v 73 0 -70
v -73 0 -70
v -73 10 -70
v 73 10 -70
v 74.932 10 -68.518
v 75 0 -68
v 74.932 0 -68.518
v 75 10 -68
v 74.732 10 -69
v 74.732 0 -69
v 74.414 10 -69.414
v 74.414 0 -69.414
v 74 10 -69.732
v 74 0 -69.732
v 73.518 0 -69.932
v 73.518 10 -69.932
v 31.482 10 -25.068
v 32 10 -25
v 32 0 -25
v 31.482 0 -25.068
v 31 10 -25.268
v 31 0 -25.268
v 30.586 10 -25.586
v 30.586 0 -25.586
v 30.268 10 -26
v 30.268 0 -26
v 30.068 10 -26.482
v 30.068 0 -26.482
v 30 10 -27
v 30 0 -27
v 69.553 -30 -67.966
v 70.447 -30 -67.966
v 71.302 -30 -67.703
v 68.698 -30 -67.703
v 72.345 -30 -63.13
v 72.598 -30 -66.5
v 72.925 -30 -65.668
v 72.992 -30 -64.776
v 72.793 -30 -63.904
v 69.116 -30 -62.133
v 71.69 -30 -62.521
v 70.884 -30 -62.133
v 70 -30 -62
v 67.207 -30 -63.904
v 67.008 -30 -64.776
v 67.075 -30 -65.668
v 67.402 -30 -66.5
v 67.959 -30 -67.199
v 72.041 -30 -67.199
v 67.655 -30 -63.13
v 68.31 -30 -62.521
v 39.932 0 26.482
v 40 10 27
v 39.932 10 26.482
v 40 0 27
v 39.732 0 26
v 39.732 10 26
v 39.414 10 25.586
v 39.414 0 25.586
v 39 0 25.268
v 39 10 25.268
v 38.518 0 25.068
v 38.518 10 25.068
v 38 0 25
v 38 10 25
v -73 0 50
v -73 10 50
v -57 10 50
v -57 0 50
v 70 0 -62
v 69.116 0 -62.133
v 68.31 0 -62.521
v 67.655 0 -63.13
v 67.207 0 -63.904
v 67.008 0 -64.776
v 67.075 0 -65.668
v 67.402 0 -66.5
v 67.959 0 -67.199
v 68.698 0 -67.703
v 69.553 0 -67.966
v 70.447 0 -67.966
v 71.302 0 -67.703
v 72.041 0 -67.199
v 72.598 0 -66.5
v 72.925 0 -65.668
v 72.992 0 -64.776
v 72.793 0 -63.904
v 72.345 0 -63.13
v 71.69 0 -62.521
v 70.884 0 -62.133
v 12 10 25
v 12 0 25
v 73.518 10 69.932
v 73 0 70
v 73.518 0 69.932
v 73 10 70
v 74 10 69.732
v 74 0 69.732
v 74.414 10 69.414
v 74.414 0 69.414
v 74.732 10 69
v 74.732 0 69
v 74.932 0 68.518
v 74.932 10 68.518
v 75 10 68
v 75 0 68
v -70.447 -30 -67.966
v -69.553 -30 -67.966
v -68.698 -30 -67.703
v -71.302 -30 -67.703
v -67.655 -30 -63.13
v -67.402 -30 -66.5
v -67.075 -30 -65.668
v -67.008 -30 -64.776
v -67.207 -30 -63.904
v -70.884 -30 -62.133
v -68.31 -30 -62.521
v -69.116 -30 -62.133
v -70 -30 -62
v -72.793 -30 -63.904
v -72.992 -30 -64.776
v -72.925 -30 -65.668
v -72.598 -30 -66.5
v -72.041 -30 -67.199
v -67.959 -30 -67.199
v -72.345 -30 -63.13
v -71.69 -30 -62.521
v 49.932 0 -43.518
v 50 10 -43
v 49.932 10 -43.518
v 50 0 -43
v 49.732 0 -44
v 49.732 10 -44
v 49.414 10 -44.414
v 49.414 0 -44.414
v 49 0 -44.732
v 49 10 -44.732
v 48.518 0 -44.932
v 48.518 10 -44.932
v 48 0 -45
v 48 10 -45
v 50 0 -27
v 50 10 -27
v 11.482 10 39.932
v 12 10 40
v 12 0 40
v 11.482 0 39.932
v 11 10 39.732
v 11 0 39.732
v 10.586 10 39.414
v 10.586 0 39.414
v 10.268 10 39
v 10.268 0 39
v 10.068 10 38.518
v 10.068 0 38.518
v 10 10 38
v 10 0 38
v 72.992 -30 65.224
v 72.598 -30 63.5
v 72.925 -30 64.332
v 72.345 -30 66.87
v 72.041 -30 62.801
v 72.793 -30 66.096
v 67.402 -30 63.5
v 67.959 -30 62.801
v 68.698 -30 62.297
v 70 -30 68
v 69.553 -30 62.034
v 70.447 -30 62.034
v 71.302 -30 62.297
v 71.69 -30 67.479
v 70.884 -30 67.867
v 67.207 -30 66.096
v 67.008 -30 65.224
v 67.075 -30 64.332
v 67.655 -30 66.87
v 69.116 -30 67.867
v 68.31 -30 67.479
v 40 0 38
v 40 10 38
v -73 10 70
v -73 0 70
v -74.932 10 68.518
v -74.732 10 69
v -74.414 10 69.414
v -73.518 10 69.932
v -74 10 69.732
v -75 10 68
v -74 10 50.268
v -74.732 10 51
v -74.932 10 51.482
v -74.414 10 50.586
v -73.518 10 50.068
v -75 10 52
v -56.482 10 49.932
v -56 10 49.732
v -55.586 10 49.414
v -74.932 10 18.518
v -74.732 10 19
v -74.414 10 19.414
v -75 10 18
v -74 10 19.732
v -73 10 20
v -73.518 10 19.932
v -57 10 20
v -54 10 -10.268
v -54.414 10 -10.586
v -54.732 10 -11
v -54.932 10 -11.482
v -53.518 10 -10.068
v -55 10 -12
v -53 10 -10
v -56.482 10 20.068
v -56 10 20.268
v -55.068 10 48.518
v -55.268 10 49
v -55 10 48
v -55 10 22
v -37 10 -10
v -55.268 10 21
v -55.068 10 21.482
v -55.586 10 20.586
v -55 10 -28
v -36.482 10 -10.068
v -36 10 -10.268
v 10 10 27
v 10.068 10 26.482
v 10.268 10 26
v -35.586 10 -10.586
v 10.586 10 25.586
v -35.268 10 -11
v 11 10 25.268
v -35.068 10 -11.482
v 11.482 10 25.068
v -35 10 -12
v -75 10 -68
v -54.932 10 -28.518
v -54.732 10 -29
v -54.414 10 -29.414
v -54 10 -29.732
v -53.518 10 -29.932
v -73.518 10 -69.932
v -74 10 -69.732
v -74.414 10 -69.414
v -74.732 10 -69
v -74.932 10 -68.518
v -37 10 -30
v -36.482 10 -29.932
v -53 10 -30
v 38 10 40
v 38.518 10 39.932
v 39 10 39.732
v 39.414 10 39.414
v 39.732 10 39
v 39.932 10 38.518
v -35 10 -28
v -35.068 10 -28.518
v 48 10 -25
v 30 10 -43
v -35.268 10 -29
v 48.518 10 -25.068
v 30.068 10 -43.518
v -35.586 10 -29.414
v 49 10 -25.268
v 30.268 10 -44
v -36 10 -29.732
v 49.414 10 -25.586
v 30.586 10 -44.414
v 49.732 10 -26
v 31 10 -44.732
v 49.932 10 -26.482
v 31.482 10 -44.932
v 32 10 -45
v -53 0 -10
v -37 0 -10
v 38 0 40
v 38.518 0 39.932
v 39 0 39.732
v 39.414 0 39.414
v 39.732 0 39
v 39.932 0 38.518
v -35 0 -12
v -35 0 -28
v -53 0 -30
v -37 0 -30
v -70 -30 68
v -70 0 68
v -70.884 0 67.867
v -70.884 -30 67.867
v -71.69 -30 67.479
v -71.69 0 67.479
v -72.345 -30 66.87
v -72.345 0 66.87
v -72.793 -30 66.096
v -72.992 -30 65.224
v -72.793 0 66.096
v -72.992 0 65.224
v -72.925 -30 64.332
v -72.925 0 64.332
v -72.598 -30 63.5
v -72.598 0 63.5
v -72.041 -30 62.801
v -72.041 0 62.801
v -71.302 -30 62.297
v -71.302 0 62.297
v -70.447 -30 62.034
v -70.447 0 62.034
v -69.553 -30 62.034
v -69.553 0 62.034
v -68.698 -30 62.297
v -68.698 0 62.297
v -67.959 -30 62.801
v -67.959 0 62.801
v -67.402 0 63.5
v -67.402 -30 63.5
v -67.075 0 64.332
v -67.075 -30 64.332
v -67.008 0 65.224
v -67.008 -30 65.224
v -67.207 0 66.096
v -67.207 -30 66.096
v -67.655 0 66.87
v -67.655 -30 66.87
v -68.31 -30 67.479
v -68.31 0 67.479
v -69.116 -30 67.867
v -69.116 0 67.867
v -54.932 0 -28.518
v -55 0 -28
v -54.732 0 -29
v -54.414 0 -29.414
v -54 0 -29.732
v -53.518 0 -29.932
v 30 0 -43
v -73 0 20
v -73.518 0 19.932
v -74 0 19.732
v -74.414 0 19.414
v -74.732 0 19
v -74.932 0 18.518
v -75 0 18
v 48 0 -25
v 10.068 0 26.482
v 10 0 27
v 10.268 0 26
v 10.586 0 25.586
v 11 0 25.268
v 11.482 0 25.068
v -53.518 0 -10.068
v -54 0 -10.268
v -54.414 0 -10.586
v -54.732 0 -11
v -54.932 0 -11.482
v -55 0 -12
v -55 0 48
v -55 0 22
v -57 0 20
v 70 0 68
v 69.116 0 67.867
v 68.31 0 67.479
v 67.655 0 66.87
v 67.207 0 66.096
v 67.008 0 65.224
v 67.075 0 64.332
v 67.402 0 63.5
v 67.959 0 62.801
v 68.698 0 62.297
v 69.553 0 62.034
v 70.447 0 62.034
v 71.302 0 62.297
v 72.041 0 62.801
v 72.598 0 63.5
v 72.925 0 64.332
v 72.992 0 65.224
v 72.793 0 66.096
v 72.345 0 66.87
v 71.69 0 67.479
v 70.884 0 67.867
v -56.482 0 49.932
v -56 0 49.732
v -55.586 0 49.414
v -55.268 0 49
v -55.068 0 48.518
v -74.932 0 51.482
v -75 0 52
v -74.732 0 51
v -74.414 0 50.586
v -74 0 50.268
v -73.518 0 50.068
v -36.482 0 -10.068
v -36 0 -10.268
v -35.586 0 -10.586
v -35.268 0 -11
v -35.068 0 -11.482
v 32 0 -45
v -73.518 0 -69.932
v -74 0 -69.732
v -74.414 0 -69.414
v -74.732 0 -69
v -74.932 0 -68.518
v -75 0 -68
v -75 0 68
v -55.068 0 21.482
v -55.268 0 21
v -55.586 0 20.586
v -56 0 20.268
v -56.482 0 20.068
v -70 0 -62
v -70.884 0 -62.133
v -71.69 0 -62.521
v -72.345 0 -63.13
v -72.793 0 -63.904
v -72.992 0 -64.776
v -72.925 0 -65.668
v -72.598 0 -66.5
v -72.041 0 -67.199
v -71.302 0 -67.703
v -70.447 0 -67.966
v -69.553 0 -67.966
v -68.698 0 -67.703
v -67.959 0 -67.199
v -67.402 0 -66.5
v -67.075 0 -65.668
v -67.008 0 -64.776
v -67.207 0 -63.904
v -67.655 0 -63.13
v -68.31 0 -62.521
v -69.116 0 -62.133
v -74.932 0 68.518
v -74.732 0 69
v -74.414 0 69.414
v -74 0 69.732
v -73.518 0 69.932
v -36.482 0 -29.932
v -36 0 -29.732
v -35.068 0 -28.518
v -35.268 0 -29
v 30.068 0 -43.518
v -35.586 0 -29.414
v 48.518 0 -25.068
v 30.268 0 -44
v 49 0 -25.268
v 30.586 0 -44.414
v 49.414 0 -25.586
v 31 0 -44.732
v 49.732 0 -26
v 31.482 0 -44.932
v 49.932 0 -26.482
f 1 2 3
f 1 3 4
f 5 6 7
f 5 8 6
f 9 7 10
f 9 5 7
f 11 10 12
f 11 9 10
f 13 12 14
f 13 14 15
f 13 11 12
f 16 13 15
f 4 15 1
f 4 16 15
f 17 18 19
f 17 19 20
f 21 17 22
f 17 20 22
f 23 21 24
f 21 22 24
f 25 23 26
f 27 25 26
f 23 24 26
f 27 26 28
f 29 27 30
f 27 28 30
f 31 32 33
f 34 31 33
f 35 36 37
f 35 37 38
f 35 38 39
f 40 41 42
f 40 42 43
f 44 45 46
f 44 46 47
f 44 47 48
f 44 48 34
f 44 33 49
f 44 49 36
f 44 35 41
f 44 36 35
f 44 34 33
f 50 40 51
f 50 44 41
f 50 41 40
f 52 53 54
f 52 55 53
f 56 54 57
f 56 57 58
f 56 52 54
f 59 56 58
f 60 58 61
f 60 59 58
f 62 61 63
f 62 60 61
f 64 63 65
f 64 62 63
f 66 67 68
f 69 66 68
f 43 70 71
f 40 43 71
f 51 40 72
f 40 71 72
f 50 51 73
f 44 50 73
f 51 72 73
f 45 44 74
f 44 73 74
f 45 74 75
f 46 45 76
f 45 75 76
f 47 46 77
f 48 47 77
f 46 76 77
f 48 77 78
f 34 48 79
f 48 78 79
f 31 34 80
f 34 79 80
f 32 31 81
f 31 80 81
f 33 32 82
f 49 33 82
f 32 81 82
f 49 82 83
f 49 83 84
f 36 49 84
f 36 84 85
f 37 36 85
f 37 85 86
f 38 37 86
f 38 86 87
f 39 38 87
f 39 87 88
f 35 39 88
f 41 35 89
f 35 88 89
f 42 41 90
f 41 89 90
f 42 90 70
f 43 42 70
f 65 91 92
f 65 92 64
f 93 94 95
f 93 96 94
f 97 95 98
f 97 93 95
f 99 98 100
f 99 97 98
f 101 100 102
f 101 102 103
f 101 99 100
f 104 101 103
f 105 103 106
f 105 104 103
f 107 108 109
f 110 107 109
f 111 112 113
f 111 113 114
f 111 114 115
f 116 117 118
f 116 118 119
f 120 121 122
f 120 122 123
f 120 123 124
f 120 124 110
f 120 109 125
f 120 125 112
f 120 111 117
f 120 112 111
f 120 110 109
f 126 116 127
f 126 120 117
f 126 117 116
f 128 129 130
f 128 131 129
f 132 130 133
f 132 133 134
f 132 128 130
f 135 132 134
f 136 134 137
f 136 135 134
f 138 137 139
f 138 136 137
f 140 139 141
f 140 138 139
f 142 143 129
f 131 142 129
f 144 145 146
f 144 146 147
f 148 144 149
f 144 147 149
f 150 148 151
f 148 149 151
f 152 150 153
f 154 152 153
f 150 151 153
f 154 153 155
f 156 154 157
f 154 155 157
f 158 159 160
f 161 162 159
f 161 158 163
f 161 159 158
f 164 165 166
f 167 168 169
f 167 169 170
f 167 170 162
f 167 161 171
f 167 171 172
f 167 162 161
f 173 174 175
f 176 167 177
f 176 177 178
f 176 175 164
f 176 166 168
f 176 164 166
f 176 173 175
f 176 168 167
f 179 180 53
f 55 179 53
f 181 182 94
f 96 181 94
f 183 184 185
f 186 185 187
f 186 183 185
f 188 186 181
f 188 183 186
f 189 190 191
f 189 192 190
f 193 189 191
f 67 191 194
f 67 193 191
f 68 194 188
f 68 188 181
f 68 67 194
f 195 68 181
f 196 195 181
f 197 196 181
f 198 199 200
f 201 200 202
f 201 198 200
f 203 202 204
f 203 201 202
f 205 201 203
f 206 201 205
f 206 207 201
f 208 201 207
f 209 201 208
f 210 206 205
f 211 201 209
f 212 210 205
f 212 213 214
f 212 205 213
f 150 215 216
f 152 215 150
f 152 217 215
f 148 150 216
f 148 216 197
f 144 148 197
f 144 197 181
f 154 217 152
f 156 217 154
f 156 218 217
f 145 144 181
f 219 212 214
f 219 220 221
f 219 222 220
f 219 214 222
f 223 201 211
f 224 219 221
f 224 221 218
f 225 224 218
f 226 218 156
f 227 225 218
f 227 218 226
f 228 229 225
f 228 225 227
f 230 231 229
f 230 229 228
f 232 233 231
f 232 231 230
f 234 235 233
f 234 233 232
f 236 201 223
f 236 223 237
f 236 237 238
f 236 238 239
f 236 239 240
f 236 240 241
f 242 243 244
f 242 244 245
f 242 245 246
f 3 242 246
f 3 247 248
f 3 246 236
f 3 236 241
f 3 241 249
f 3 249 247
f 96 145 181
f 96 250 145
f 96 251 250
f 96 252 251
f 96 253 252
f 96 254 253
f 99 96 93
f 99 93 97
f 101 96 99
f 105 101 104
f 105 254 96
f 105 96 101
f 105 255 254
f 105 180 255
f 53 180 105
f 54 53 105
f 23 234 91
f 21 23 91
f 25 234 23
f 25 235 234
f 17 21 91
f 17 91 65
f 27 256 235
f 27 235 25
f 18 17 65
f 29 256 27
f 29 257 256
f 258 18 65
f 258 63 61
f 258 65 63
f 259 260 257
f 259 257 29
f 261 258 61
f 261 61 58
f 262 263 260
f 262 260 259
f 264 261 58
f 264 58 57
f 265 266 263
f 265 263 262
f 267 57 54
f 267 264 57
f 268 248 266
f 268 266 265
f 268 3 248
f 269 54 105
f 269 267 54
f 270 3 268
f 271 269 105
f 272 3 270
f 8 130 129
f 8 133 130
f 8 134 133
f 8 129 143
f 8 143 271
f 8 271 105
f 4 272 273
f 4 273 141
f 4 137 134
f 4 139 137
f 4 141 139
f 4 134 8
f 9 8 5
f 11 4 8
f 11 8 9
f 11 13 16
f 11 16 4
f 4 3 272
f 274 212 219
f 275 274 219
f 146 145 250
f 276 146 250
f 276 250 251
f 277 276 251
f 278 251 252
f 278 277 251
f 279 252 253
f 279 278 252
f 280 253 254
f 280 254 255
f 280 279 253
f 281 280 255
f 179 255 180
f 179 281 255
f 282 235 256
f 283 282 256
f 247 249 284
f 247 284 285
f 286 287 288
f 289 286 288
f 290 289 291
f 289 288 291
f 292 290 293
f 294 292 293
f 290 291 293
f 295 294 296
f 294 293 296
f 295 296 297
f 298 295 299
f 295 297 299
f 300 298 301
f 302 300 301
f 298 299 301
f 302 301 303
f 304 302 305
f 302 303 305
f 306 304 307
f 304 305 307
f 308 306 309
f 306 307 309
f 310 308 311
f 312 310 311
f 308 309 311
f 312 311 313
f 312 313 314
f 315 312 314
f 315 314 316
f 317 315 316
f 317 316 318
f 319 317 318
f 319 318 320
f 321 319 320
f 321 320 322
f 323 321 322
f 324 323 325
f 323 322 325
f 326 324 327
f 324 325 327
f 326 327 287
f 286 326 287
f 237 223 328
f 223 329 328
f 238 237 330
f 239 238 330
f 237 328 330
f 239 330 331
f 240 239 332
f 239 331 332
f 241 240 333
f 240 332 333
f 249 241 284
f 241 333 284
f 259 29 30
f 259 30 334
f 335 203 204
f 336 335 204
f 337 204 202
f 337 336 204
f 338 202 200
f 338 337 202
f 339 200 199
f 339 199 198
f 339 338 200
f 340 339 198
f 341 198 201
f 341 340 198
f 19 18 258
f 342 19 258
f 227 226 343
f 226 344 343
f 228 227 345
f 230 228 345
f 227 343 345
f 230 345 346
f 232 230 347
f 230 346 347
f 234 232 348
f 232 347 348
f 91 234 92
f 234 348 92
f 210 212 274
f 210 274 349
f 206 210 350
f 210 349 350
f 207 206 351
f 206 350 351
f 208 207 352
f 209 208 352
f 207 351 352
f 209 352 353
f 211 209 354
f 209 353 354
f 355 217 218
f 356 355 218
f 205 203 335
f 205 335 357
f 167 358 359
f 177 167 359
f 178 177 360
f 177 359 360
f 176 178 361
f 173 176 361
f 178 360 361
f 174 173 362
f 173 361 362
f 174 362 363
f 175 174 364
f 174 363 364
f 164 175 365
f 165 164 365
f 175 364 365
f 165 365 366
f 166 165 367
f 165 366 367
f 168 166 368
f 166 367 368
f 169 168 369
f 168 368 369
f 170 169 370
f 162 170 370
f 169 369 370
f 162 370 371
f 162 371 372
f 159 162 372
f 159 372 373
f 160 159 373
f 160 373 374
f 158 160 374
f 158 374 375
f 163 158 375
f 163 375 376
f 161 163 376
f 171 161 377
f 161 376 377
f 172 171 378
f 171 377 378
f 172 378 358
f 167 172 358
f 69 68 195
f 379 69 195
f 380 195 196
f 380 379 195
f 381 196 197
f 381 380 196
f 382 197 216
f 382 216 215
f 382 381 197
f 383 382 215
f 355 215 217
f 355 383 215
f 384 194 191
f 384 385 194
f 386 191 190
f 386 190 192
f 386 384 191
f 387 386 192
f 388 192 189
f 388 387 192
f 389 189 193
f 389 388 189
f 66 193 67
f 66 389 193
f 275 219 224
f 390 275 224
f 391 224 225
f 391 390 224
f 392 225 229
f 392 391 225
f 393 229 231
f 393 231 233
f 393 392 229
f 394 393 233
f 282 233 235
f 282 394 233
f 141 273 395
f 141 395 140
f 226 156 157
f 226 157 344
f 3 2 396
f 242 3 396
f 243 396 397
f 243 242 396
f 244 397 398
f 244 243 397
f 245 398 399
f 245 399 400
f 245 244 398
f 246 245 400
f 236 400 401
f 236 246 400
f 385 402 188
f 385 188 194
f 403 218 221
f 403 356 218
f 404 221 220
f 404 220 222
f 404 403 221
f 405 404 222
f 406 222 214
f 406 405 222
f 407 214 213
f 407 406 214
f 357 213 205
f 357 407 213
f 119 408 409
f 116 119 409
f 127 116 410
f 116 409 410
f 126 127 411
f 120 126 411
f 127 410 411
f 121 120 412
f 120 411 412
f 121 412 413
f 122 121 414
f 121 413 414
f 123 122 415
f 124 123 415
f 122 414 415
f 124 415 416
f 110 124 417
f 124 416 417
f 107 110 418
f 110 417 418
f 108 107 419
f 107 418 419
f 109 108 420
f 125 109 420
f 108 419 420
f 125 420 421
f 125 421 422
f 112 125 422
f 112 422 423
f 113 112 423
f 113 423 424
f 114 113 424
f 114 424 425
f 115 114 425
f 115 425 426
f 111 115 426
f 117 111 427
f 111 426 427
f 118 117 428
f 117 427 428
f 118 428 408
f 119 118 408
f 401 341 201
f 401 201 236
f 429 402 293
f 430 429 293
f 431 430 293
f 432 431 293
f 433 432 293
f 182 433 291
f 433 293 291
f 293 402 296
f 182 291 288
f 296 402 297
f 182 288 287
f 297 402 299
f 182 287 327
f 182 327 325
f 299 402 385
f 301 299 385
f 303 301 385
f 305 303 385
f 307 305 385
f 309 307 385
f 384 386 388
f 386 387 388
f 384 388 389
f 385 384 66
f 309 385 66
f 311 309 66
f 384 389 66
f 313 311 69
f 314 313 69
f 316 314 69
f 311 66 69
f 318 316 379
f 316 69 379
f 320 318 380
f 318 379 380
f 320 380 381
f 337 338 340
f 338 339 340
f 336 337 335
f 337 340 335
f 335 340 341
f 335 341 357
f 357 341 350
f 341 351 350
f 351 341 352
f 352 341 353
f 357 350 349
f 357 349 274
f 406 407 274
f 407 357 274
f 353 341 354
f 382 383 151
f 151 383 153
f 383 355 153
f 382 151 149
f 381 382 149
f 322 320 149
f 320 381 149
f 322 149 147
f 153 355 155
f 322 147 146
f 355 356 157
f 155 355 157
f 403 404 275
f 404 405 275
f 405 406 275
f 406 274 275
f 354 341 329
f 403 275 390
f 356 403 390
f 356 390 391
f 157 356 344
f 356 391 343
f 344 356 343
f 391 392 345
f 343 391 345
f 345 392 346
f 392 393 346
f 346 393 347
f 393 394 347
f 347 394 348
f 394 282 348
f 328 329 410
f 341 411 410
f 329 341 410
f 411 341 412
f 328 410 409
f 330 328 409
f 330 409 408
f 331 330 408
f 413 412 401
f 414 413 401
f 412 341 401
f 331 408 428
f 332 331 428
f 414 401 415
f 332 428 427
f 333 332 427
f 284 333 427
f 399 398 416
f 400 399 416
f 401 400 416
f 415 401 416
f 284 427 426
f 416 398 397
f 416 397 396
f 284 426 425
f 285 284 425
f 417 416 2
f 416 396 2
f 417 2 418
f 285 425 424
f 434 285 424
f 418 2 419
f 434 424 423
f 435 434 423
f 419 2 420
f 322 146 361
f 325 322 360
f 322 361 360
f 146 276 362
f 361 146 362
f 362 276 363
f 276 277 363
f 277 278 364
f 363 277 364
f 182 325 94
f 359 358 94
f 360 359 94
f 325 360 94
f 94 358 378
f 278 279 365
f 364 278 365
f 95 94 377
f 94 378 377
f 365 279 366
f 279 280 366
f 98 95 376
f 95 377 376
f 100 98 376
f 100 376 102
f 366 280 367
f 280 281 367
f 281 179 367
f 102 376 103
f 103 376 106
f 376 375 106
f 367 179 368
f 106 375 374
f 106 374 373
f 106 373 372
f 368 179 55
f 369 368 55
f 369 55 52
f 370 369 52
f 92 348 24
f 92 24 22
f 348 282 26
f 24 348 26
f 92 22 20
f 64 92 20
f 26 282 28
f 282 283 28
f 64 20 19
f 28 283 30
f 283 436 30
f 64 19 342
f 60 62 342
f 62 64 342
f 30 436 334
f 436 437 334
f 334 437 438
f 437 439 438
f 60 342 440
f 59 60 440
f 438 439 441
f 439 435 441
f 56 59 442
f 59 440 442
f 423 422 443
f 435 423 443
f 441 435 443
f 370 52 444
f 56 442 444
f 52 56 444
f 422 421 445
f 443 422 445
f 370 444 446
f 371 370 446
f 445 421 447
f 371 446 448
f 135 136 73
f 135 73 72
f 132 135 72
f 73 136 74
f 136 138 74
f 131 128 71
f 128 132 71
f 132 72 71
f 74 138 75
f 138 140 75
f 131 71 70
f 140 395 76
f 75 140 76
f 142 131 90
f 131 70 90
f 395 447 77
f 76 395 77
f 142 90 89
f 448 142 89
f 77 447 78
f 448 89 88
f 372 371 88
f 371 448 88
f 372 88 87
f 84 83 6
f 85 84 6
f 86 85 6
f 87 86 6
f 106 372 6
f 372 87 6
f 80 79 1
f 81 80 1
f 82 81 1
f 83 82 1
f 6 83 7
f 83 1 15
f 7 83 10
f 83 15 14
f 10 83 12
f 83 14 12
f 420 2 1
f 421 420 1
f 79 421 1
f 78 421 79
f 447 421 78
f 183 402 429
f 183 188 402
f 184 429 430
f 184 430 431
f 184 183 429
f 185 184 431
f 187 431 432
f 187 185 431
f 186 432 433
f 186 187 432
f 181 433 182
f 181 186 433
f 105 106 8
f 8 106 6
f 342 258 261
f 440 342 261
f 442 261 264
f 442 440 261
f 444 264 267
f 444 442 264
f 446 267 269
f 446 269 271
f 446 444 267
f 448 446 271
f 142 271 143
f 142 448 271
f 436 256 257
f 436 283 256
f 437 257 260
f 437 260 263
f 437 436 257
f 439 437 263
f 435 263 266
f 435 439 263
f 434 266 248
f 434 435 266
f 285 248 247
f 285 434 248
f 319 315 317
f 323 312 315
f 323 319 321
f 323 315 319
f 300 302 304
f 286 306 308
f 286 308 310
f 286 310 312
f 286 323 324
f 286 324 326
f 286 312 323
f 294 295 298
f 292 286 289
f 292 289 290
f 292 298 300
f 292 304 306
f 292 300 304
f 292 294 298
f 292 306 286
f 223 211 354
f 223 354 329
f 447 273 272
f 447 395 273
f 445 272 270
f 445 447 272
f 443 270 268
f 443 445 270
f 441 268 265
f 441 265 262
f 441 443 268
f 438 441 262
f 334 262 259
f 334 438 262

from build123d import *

# Parameters (mm, degrees)
SKETCH1_W           = 150
SKETCH1_H           = 140
BOSS_EXTRUDE1_DEPTH = 10
SKETCH2_R           = 3
BOSS_EXTRUDE2_DEPTH = 30
SKETCH4_W           = 20
SKETCH4_H           = 20
CUT_EXTRUDE2_DEPTH  = 111.113577728
SKETCH6_W           = 20
SKETCH6_H           = 30
CUT_EXTRUDE3_DEPTH  = 111.113577728
SKETCH7_W           = 30
SKETCH7_H           = 15
CUT_EXTRUDE4_DEPTH  = 111.113577728
SKETCH8_W           = 20
SKETCH8_H           = 20
CUT_EXTRUDE5_DEPTH  = 111.113577728
FILLET2_R           = 2


with BuildPart() as part:
    # Sketch1 → Boss-Extrude1 (new body)
    with BuildSketch(Plane(origin=(0, 0, 0), x_dir=(1, 0, 0), z_dir=(0, 1, 0))):
        Rectangle(SKETCH1_W, SKETCH1_H)
    extrude(amount=BOSS_EXTRUDE1_DEPTH)

    # Sketch2 → Boss-Extrude2 (add)
    with BuildSketch(Plane.XZ):
        with Locations(Location((-70, 65, 0), (0, 0, 90))):
            Circle(SKETCH2_R)
        with Locations(Location((70, 65, 0), (0, 0, 90))):
            Circle(SKETCH2_R)
        with Locations(Location((70, -65, 0), (0, 0, 90))):
            Circle(SKETCH2_R)
        with Locations(Location((-70, -65, 0), (0, 0, 90))):
            Circle(SKETCH2_R)
    extrude(amount=BOSS_EXTRUDE2_DEPTH)

    # Sketch4 → Cut-Extrude2 (cut, through all)
    with BuildSketch(Plane(origin=(0, 10, 0), x_dir=(1, 0, 0), z_dir=(0, 1, 0))):
        with Locations((-45, 20)):
            Rectangle(SKETCH4_W, SKETCH4_H)
    extrude(amount=-CUT_EXTRUDE2_DEPTH, mode=Mode.SUBTRACT)

    # Sketch6 → Cut-Extrude3 (cut, through all)
    with BuildSketch(Plane(origin=(0, 10, 0), x_dir=(1, 0, 0), z_dir=(0, 1, 0))):
        with Locations((-65, -35)):
            Rectangle(SKETCH6_W, SKETCH6_H)
    extrude(amount=-CUT_EXTRUDE3_DEPTH, mode=Mode.SUBTRACT)

    # Sketch7 → Cut-Extrude4 (cut, through all)
    with BuildSketch(Plane(origin=(0, 10, 0), x_dir=(1, 0, 0), z_dir=(0, 1, 0))):
        with Locations((25, -32.5)):
            Rectangle(SKETCH7_W, SKETCH7_H)
    extrude(amount=-CUT_EXTRUDE4_DEPTH, mode=Mode.SUBTRACT)

    # Sketch8 → Cut-Extrude5 (cut, through all)
    with BuildSketch(Plane(origin=(0, 10, 0), x_dir=(1, 0, 0), z_dir=(0, 1, 0))):
        with Locations((40, 35)):
            Rectangle(SKETCH8_W, SKETCH8_H)
    extrude(amount=-CUT_EXTRUDE5_DEPTH, mode=Mode.SUBTRACT)

    # Fillet2
    fillet2_edges = [part.edges().sort_by_distance(p)[0] for p in [
        (-35, 5, -30),
        (-35, 5, -10),
        (-55, 5, -10),
        (-55, 5, -30),
        (-75, 5, 50),
        (-75, 5, 20),
        (-55, 5, 20),
        (-55, 5, 50),
        (40, 5, 25),
        (40, 5, 40),
        (10, 5, 40),
        (10, 5, 25),
        (-75, 5, -70),
        (75, 5, -70),
        (75, 5, 70),
        (-75, 5, 70),
        (30, 5, -25),
        (30, 5, -45),
        (50, 5, -45),
        (50, 5, -25),
    ]]
    fillet(fillet2_edges, radius=FILLET2_R)


solid = part.part
